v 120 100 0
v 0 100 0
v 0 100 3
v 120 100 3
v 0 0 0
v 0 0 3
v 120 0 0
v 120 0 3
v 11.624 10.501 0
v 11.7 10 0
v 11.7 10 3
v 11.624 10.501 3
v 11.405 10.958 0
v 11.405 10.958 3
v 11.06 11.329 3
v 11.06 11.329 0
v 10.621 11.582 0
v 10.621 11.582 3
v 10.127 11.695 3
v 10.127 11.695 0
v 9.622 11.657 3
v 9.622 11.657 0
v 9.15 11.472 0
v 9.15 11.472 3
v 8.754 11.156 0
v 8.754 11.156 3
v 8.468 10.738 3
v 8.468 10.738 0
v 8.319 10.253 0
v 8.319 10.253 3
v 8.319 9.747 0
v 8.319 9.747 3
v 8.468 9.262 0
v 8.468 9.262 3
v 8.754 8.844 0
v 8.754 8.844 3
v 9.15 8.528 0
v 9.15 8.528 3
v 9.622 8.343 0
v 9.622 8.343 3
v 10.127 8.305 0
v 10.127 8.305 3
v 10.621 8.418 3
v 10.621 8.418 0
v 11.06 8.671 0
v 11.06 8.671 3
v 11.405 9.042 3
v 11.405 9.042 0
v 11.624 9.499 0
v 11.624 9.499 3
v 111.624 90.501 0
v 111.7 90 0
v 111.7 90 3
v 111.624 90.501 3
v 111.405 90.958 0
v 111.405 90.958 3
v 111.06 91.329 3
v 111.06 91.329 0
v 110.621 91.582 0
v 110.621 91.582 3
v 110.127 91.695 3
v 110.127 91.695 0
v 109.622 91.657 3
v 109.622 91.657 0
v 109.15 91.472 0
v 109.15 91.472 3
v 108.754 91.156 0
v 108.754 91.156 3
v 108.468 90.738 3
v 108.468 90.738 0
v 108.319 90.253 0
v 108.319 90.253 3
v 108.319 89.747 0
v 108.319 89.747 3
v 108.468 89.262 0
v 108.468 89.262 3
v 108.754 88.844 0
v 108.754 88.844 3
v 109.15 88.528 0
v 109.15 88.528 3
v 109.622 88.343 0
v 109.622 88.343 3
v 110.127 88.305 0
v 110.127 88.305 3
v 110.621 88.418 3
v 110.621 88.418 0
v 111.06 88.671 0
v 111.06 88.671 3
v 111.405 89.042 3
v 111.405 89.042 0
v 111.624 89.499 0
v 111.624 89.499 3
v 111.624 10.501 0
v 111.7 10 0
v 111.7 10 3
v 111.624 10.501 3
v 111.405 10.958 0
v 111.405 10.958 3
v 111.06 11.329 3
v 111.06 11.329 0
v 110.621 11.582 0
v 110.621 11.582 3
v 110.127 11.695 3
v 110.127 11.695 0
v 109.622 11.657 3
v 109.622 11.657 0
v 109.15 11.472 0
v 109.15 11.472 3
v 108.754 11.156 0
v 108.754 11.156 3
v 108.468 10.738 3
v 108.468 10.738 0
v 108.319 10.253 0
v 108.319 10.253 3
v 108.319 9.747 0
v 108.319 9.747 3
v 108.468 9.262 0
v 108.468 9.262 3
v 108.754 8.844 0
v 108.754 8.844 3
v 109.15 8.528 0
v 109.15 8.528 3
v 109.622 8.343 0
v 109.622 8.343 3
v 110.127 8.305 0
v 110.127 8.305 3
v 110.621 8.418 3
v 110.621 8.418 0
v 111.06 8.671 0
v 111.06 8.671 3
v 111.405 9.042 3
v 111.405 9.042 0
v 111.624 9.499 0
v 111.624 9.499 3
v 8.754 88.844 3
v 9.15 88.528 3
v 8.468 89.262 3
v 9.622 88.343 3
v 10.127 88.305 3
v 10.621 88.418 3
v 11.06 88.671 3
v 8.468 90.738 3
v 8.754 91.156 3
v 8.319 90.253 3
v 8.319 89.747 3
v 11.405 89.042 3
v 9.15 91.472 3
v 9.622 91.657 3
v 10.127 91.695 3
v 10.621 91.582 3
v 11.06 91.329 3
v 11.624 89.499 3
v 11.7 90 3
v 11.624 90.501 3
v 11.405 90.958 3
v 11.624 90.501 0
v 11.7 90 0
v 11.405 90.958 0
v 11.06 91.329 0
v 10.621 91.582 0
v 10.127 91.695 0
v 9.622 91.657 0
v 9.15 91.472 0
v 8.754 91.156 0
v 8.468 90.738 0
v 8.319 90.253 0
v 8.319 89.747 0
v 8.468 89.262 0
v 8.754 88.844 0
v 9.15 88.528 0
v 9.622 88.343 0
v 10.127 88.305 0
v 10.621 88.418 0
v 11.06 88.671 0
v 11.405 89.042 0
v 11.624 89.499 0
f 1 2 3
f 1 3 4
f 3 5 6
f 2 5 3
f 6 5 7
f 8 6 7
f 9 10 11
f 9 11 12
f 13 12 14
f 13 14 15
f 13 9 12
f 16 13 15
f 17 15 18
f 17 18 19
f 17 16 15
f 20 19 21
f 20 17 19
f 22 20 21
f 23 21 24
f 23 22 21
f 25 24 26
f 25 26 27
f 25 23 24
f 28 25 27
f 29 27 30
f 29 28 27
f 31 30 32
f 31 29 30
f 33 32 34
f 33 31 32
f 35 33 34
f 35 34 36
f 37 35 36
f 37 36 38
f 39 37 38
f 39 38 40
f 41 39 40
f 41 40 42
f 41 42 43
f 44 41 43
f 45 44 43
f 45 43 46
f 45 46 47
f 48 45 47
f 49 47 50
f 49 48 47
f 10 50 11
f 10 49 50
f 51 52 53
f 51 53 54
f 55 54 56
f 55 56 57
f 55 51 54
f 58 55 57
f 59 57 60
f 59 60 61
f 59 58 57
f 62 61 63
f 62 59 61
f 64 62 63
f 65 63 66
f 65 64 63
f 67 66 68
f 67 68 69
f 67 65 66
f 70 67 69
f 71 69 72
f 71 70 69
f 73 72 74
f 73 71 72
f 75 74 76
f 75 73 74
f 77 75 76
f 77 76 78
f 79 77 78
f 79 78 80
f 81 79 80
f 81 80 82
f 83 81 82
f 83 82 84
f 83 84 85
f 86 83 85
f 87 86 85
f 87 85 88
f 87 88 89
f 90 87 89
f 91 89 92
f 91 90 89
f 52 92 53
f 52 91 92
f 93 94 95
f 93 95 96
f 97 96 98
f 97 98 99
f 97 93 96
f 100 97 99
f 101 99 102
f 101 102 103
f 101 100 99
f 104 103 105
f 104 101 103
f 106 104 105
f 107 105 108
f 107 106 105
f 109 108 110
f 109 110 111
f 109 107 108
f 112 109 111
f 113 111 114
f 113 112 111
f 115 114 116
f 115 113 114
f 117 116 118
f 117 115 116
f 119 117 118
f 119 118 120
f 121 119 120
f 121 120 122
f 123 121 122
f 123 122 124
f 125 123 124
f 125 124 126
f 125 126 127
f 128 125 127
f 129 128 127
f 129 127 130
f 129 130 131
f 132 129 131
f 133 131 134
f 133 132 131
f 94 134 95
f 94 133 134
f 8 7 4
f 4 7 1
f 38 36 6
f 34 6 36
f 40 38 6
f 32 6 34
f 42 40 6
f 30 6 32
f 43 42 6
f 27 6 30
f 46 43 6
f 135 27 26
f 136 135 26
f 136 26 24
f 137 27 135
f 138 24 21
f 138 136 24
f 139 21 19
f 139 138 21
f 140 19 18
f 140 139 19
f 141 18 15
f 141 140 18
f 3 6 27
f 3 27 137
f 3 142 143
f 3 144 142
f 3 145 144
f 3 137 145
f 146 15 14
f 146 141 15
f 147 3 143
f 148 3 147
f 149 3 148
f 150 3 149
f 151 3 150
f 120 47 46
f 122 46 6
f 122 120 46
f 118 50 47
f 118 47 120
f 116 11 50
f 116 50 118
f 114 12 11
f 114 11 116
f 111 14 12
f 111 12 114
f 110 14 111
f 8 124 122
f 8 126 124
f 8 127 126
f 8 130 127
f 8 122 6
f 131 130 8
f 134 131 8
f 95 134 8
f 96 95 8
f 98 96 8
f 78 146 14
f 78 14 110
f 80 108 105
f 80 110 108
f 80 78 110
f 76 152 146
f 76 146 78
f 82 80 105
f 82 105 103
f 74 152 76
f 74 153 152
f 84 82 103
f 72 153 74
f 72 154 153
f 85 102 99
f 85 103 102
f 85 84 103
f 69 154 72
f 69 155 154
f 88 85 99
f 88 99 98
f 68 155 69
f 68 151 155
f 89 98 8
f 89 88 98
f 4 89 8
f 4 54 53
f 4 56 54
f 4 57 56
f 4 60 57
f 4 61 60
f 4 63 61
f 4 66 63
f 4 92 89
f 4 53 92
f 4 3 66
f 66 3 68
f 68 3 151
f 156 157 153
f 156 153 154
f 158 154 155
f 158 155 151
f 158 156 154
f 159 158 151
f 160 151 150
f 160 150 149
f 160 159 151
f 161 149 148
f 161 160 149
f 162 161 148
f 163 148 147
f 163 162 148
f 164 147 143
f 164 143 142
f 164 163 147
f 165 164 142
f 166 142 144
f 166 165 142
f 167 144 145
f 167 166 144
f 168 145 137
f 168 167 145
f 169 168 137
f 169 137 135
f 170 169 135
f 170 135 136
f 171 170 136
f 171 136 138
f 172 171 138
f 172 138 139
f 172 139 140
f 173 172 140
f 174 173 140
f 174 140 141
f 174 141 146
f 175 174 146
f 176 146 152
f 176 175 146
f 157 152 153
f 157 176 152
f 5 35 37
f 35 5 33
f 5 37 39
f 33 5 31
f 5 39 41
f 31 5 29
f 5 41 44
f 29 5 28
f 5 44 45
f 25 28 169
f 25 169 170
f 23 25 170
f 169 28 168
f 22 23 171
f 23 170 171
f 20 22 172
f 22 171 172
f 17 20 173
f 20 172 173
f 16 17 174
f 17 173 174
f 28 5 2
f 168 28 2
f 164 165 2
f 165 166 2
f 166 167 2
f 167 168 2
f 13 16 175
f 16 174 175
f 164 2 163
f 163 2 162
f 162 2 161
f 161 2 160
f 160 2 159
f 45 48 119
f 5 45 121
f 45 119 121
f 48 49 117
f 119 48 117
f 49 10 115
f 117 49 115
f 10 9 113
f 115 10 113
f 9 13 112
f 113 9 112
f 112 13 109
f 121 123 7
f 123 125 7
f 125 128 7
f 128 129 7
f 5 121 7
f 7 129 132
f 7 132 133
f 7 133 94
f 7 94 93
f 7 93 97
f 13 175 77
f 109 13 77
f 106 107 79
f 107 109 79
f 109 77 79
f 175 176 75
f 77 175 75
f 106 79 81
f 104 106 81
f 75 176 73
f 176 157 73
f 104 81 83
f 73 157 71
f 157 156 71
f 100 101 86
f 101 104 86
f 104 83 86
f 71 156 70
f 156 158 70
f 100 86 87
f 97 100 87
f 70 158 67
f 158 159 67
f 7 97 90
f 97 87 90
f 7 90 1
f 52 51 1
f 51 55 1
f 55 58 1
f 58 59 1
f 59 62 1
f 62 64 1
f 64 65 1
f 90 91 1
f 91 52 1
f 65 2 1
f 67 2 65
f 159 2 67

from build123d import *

# Parameters (mm, degrees)
CAMERA_REMOVABLE_PANEL_W = 120
CAMERA_REMOVABLE_PANEL_H = 100
CAMERA_REMOVABLE_PANEL_R = 1.7
F_3MM_DEPTH              = 3


with BuildPart() as part:
    # 外形与孔位_camera_removable_panel → 板厚_3mm (new body)
    with BuildSketch(Plane.XY):
        with Locations((60, 50)):
            Rectangle(CAMERA_REMOVABLE_PANEL_W, CAMERA_REMOVABLE_PANEL_H)
        with Locations((10, 10)):
            Circle(CAMERA_REMOVABLE_PANEL_R, mode=Mode.SUBTRACT)
        with Locations((10, 90)):
            Circle(CAMERA_REMOVABLE_PANEL_R, mode=Mode.SUBTRACT)
        with Locations((110, 10)):
            Circle(CAMERA_REMOVABLE_PANEL_R, mode=Mode.SUBTRACT)
        with Locations((110, 90)):
            Circle(CAMERA_REMOVABLE_PANEL_R, mode=Mode.SUBTRACT)
    extrude(amount=F_3MM_DEPTH)


solid = part.part
